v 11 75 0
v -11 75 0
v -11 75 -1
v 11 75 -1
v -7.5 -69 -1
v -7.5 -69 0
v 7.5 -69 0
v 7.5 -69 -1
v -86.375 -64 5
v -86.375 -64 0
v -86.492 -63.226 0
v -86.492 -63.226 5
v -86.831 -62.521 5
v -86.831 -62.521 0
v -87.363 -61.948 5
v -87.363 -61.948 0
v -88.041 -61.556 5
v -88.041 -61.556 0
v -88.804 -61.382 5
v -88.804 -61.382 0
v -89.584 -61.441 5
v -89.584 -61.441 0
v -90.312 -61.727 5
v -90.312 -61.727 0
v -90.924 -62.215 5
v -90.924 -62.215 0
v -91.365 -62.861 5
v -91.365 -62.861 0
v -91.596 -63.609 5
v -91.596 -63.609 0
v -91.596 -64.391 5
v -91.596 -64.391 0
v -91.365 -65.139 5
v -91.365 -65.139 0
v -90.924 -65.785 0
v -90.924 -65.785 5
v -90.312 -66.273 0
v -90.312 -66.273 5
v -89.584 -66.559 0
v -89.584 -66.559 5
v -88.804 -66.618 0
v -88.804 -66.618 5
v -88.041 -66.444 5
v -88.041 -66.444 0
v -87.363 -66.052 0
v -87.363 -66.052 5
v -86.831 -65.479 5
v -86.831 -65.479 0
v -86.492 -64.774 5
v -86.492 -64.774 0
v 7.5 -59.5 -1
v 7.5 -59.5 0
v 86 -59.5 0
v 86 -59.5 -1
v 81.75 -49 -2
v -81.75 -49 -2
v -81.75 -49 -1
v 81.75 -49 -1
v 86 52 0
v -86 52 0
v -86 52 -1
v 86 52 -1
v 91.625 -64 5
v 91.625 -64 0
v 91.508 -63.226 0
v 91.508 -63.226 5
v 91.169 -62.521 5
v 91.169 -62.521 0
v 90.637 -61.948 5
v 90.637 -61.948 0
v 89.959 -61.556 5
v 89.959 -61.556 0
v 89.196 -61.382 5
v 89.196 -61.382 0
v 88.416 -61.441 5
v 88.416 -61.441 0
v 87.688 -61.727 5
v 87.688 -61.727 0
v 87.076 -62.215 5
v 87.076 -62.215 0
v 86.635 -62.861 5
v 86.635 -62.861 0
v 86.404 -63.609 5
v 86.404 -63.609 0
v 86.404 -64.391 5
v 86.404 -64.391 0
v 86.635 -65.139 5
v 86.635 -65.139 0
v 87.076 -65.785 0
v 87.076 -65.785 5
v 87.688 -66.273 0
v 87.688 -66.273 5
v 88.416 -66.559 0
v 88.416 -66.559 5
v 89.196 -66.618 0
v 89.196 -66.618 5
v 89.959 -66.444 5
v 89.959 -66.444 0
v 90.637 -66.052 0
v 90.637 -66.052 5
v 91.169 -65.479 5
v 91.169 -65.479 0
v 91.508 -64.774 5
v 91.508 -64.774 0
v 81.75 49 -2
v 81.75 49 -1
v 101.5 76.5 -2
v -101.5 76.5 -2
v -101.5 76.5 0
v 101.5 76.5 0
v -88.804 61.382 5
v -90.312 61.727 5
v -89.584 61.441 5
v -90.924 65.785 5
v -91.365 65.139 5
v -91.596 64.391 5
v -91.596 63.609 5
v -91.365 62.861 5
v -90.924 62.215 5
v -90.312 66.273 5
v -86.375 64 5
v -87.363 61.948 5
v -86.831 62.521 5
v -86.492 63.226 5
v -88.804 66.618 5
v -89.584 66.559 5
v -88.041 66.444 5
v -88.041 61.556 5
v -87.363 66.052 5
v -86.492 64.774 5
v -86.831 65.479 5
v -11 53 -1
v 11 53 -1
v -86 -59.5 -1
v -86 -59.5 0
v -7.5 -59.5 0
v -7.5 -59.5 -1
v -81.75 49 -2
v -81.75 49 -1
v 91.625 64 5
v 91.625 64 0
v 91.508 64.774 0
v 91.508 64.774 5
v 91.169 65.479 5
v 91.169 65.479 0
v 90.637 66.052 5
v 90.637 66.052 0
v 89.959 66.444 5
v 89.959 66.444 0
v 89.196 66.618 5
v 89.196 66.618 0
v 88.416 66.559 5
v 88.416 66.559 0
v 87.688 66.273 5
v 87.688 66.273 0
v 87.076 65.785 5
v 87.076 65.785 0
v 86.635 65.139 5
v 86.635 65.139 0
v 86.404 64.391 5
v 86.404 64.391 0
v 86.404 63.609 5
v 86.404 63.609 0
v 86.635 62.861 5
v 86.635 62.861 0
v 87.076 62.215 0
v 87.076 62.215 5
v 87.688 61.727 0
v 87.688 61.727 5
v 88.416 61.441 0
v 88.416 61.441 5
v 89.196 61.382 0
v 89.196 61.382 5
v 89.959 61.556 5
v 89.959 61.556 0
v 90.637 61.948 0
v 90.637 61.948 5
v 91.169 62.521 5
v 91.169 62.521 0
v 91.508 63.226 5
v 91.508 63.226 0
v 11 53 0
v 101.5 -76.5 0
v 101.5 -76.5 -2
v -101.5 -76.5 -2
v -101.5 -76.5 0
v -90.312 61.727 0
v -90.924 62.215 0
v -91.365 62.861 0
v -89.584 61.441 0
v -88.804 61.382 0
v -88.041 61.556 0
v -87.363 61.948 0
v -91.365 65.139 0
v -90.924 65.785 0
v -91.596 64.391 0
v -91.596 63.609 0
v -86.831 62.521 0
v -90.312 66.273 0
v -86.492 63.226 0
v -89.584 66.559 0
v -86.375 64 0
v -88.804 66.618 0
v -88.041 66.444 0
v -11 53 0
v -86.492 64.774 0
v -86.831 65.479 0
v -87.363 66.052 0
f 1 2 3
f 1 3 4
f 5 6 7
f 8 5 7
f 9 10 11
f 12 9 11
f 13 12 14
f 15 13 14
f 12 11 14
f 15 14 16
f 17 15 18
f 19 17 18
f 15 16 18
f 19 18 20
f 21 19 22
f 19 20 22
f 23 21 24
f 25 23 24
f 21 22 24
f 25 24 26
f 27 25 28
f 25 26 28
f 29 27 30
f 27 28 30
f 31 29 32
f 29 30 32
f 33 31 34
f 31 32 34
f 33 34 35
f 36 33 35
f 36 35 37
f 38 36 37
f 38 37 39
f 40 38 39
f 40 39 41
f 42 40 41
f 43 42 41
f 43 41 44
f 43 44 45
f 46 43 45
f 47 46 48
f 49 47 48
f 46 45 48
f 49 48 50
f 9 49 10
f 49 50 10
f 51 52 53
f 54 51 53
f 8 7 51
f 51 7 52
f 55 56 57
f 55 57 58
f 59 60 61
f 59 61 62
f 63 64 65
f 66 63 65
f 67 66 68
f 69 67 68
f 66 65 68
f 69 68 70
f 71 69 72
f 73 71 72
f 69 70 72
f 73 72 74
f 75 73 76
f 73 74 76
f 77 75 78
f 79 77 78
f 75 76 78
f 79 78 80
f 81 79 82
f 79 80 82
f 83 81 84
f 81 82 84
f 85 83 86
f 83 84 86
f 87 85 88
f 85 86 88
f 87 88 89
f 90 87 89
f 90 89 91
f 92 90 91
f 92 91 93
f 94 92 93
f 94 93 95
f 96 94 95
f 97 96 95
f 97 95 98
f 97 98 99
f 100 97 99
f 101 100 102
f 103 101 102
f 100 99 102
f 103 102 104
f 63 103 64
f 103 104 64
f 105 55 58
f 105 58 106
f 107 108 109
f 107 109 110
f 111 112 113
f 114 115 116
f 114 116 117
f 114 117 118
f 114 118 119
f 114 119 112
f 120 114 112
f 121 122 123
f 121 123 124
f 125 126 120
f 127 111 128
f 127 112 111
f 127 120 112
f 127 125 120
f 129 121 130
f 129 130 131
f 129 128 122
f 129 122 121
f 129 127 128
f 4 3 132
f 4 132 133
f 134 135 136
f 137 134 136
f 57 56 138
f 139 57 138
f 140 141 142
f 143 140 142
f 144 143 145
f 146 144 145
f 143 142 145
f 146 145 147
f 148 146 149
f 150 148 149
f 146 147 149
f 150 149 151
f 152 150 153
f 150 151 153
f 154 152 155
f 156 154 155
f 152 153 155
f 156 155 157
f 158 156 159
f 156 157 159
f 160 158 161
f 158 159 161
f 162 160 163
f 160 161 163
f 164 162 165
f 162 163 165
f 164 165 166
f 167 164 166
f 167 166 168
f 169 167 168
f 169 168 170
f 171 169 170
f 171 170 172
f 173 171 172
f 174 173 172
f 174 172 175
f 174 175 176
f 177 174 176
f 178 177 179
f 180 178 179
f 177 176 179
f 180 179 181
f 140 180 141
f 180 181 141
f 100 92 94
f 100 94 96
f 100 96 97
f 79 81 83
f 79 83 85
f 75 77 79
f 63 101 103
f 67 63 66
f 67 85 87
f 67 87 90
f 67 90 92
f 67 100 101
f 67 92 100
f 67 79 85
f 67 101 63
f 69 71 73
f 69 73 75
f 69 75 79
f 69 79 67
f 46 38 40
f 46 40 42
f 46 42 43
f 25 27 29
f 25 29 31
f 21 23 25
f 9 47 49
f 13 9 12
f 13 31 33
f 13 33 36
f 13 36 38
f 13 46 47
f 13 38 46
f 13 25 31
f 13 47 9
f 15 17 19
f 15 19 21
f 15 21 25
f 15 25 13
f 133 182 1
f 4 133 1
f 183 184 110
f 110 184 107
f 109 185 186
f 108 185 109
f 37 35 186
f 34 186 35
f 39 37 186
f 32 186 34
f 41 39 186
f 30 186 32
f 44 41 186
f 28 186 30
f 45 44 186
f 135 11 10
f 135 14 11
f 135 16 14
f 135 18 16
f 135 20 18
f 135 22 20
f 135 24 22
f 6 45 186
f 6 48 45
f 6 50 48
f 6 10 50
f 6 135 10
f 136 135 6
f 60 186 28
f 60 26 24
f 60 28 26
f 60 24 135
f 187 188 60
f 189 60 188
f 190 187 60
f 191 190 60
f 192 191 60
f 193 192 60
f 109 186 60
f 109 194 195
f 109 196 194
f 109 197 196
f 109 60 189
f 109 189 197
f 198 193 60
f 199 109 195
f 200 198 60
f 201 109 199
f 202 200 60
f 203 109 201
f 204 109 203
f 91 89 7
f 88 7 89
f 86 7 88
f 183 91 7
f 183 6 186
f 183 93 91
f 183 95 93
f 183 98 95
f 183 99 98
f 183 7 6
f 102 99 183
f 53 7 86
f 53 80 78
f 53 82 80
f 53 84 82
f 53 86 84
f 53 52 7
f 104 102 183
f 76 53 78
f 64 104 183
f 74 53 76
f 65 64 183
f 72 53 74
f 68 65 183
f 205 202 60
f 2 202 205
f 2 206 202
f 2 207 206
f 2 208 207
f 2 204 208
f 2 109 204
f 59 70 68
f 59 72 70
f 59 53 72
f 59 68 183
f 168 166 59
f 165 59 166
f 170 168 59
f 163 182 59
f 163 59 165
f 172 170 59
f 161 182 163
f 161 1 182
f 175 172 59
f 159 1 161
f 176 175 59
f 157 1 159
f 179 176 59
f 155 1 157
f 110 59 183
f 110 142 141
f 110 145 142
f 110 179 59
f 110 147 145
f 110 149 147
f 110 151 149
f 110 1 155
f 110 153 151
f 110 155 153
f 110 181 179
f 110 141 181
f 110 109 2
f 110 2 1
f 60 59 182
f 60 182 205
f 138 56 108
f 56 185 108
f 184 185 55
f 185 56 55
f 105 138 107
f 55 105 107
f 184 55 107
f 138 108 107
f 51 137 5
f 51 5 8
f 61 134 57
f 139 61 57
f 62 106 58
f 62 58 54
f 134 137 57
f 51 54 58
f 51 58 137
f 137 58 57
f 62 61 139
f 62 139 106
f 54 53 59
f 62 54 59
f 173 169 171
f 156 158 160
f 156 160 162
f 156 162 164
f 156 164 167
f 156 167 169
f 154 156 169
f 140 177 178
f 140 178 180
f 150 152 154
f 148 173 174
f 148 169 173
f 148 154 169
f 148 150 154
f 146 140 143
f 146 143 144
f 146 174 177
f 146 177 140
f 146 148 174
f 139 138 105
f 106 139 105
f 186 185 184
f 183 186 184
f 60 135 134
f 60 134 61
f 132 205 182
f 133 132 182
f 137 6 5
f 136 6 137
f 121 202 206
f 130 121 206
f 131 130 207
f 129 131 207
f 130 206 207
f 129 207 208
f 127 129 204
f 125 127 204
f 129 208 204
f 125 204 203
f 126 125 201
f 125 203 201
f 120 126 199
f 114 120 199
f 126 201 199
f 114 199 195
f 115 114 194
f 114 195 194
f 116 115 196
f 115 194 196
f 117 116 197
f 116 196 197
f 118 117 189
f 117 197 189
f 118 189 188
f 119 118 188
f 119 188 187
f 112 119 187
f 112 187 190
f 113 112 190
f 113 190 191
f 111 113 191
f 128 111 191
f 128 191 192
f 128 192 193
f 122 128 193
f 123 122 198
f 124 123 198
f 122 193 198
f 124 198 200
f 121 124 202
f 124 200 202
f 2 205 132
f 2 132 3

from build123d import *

# Parameters (mm, degrees)
SKETCH_W        = 203
SKETCH_H        = 153
SKETCH_W_2      = 163.5
SKETCH_H_2      = 98
PAD_DEPTH       = 2
SKETCH003_W     = 172
SKETCH003_H     = 111.5
POCKET001_DEPTH = 1
SKETCH002_W     = 22
SKETCH002_H     = 22
SKETCH002_W_2   = 15
SKETCH002_H_2   = 15
POCKET_DEPTH    = 1
SKETCH001_R     = 2.625
PAD001_DEPTH    = 5


with BuildPart() as part:
    # Sketch (on DatumPlane) → Pad (new body)
    with BuildSketch(Plane.XY.offset(-2)):
        Rectangle(SKETCH_W, SKETCH_H)
        Rectangle(SKETCH_W_2, SKETCH_H_2, mode=Mode.SUBTRACT)
    extrude(amount=PAD_DEPTH)

    # Sketch003 (on DatumPlane) → Pocket001 (cut)
    with BuildSketch(Plane.XY):
        with Locations((0, -3.75)):
            Rectangle(SKETCH003_W, SKETCH003_H)
    extrude(amount=-POCKET001_DEPTH, mode=Mode.SUBTRACT)

    # Sketch002 (on DatumPlane) → Pocket (cut)
    with BuildSketch(Plane.XY):
        with Locations((0, 64)):
            Rectangle(SKETCH002_W, SKETCH002_H)
        with Locations((0, -61.5)):
            Rectangle(SKETCH002_W_2, SKETCH002_H_2)
    extrude(amount=-POCKET_DEPTH, mode=Mode.SUBTRACT)

    # Sketch001 (on DatumPlane) → Pad001 (join)
    with BuildSketch(Plane.XY):
        with Locations((89, 64)):
            Circle(SKETCH001_R)
        with Locations((-89, 64)):
            Circle(SKETCH001_R)
        with Locations((-89, -64)):
            Circle(SKETCH001_R)
        with Locations((89, -64)):
            Circle(SKETCH001_R)
    extrude(amount=PAD001_DEPTH)


solid = part.part
